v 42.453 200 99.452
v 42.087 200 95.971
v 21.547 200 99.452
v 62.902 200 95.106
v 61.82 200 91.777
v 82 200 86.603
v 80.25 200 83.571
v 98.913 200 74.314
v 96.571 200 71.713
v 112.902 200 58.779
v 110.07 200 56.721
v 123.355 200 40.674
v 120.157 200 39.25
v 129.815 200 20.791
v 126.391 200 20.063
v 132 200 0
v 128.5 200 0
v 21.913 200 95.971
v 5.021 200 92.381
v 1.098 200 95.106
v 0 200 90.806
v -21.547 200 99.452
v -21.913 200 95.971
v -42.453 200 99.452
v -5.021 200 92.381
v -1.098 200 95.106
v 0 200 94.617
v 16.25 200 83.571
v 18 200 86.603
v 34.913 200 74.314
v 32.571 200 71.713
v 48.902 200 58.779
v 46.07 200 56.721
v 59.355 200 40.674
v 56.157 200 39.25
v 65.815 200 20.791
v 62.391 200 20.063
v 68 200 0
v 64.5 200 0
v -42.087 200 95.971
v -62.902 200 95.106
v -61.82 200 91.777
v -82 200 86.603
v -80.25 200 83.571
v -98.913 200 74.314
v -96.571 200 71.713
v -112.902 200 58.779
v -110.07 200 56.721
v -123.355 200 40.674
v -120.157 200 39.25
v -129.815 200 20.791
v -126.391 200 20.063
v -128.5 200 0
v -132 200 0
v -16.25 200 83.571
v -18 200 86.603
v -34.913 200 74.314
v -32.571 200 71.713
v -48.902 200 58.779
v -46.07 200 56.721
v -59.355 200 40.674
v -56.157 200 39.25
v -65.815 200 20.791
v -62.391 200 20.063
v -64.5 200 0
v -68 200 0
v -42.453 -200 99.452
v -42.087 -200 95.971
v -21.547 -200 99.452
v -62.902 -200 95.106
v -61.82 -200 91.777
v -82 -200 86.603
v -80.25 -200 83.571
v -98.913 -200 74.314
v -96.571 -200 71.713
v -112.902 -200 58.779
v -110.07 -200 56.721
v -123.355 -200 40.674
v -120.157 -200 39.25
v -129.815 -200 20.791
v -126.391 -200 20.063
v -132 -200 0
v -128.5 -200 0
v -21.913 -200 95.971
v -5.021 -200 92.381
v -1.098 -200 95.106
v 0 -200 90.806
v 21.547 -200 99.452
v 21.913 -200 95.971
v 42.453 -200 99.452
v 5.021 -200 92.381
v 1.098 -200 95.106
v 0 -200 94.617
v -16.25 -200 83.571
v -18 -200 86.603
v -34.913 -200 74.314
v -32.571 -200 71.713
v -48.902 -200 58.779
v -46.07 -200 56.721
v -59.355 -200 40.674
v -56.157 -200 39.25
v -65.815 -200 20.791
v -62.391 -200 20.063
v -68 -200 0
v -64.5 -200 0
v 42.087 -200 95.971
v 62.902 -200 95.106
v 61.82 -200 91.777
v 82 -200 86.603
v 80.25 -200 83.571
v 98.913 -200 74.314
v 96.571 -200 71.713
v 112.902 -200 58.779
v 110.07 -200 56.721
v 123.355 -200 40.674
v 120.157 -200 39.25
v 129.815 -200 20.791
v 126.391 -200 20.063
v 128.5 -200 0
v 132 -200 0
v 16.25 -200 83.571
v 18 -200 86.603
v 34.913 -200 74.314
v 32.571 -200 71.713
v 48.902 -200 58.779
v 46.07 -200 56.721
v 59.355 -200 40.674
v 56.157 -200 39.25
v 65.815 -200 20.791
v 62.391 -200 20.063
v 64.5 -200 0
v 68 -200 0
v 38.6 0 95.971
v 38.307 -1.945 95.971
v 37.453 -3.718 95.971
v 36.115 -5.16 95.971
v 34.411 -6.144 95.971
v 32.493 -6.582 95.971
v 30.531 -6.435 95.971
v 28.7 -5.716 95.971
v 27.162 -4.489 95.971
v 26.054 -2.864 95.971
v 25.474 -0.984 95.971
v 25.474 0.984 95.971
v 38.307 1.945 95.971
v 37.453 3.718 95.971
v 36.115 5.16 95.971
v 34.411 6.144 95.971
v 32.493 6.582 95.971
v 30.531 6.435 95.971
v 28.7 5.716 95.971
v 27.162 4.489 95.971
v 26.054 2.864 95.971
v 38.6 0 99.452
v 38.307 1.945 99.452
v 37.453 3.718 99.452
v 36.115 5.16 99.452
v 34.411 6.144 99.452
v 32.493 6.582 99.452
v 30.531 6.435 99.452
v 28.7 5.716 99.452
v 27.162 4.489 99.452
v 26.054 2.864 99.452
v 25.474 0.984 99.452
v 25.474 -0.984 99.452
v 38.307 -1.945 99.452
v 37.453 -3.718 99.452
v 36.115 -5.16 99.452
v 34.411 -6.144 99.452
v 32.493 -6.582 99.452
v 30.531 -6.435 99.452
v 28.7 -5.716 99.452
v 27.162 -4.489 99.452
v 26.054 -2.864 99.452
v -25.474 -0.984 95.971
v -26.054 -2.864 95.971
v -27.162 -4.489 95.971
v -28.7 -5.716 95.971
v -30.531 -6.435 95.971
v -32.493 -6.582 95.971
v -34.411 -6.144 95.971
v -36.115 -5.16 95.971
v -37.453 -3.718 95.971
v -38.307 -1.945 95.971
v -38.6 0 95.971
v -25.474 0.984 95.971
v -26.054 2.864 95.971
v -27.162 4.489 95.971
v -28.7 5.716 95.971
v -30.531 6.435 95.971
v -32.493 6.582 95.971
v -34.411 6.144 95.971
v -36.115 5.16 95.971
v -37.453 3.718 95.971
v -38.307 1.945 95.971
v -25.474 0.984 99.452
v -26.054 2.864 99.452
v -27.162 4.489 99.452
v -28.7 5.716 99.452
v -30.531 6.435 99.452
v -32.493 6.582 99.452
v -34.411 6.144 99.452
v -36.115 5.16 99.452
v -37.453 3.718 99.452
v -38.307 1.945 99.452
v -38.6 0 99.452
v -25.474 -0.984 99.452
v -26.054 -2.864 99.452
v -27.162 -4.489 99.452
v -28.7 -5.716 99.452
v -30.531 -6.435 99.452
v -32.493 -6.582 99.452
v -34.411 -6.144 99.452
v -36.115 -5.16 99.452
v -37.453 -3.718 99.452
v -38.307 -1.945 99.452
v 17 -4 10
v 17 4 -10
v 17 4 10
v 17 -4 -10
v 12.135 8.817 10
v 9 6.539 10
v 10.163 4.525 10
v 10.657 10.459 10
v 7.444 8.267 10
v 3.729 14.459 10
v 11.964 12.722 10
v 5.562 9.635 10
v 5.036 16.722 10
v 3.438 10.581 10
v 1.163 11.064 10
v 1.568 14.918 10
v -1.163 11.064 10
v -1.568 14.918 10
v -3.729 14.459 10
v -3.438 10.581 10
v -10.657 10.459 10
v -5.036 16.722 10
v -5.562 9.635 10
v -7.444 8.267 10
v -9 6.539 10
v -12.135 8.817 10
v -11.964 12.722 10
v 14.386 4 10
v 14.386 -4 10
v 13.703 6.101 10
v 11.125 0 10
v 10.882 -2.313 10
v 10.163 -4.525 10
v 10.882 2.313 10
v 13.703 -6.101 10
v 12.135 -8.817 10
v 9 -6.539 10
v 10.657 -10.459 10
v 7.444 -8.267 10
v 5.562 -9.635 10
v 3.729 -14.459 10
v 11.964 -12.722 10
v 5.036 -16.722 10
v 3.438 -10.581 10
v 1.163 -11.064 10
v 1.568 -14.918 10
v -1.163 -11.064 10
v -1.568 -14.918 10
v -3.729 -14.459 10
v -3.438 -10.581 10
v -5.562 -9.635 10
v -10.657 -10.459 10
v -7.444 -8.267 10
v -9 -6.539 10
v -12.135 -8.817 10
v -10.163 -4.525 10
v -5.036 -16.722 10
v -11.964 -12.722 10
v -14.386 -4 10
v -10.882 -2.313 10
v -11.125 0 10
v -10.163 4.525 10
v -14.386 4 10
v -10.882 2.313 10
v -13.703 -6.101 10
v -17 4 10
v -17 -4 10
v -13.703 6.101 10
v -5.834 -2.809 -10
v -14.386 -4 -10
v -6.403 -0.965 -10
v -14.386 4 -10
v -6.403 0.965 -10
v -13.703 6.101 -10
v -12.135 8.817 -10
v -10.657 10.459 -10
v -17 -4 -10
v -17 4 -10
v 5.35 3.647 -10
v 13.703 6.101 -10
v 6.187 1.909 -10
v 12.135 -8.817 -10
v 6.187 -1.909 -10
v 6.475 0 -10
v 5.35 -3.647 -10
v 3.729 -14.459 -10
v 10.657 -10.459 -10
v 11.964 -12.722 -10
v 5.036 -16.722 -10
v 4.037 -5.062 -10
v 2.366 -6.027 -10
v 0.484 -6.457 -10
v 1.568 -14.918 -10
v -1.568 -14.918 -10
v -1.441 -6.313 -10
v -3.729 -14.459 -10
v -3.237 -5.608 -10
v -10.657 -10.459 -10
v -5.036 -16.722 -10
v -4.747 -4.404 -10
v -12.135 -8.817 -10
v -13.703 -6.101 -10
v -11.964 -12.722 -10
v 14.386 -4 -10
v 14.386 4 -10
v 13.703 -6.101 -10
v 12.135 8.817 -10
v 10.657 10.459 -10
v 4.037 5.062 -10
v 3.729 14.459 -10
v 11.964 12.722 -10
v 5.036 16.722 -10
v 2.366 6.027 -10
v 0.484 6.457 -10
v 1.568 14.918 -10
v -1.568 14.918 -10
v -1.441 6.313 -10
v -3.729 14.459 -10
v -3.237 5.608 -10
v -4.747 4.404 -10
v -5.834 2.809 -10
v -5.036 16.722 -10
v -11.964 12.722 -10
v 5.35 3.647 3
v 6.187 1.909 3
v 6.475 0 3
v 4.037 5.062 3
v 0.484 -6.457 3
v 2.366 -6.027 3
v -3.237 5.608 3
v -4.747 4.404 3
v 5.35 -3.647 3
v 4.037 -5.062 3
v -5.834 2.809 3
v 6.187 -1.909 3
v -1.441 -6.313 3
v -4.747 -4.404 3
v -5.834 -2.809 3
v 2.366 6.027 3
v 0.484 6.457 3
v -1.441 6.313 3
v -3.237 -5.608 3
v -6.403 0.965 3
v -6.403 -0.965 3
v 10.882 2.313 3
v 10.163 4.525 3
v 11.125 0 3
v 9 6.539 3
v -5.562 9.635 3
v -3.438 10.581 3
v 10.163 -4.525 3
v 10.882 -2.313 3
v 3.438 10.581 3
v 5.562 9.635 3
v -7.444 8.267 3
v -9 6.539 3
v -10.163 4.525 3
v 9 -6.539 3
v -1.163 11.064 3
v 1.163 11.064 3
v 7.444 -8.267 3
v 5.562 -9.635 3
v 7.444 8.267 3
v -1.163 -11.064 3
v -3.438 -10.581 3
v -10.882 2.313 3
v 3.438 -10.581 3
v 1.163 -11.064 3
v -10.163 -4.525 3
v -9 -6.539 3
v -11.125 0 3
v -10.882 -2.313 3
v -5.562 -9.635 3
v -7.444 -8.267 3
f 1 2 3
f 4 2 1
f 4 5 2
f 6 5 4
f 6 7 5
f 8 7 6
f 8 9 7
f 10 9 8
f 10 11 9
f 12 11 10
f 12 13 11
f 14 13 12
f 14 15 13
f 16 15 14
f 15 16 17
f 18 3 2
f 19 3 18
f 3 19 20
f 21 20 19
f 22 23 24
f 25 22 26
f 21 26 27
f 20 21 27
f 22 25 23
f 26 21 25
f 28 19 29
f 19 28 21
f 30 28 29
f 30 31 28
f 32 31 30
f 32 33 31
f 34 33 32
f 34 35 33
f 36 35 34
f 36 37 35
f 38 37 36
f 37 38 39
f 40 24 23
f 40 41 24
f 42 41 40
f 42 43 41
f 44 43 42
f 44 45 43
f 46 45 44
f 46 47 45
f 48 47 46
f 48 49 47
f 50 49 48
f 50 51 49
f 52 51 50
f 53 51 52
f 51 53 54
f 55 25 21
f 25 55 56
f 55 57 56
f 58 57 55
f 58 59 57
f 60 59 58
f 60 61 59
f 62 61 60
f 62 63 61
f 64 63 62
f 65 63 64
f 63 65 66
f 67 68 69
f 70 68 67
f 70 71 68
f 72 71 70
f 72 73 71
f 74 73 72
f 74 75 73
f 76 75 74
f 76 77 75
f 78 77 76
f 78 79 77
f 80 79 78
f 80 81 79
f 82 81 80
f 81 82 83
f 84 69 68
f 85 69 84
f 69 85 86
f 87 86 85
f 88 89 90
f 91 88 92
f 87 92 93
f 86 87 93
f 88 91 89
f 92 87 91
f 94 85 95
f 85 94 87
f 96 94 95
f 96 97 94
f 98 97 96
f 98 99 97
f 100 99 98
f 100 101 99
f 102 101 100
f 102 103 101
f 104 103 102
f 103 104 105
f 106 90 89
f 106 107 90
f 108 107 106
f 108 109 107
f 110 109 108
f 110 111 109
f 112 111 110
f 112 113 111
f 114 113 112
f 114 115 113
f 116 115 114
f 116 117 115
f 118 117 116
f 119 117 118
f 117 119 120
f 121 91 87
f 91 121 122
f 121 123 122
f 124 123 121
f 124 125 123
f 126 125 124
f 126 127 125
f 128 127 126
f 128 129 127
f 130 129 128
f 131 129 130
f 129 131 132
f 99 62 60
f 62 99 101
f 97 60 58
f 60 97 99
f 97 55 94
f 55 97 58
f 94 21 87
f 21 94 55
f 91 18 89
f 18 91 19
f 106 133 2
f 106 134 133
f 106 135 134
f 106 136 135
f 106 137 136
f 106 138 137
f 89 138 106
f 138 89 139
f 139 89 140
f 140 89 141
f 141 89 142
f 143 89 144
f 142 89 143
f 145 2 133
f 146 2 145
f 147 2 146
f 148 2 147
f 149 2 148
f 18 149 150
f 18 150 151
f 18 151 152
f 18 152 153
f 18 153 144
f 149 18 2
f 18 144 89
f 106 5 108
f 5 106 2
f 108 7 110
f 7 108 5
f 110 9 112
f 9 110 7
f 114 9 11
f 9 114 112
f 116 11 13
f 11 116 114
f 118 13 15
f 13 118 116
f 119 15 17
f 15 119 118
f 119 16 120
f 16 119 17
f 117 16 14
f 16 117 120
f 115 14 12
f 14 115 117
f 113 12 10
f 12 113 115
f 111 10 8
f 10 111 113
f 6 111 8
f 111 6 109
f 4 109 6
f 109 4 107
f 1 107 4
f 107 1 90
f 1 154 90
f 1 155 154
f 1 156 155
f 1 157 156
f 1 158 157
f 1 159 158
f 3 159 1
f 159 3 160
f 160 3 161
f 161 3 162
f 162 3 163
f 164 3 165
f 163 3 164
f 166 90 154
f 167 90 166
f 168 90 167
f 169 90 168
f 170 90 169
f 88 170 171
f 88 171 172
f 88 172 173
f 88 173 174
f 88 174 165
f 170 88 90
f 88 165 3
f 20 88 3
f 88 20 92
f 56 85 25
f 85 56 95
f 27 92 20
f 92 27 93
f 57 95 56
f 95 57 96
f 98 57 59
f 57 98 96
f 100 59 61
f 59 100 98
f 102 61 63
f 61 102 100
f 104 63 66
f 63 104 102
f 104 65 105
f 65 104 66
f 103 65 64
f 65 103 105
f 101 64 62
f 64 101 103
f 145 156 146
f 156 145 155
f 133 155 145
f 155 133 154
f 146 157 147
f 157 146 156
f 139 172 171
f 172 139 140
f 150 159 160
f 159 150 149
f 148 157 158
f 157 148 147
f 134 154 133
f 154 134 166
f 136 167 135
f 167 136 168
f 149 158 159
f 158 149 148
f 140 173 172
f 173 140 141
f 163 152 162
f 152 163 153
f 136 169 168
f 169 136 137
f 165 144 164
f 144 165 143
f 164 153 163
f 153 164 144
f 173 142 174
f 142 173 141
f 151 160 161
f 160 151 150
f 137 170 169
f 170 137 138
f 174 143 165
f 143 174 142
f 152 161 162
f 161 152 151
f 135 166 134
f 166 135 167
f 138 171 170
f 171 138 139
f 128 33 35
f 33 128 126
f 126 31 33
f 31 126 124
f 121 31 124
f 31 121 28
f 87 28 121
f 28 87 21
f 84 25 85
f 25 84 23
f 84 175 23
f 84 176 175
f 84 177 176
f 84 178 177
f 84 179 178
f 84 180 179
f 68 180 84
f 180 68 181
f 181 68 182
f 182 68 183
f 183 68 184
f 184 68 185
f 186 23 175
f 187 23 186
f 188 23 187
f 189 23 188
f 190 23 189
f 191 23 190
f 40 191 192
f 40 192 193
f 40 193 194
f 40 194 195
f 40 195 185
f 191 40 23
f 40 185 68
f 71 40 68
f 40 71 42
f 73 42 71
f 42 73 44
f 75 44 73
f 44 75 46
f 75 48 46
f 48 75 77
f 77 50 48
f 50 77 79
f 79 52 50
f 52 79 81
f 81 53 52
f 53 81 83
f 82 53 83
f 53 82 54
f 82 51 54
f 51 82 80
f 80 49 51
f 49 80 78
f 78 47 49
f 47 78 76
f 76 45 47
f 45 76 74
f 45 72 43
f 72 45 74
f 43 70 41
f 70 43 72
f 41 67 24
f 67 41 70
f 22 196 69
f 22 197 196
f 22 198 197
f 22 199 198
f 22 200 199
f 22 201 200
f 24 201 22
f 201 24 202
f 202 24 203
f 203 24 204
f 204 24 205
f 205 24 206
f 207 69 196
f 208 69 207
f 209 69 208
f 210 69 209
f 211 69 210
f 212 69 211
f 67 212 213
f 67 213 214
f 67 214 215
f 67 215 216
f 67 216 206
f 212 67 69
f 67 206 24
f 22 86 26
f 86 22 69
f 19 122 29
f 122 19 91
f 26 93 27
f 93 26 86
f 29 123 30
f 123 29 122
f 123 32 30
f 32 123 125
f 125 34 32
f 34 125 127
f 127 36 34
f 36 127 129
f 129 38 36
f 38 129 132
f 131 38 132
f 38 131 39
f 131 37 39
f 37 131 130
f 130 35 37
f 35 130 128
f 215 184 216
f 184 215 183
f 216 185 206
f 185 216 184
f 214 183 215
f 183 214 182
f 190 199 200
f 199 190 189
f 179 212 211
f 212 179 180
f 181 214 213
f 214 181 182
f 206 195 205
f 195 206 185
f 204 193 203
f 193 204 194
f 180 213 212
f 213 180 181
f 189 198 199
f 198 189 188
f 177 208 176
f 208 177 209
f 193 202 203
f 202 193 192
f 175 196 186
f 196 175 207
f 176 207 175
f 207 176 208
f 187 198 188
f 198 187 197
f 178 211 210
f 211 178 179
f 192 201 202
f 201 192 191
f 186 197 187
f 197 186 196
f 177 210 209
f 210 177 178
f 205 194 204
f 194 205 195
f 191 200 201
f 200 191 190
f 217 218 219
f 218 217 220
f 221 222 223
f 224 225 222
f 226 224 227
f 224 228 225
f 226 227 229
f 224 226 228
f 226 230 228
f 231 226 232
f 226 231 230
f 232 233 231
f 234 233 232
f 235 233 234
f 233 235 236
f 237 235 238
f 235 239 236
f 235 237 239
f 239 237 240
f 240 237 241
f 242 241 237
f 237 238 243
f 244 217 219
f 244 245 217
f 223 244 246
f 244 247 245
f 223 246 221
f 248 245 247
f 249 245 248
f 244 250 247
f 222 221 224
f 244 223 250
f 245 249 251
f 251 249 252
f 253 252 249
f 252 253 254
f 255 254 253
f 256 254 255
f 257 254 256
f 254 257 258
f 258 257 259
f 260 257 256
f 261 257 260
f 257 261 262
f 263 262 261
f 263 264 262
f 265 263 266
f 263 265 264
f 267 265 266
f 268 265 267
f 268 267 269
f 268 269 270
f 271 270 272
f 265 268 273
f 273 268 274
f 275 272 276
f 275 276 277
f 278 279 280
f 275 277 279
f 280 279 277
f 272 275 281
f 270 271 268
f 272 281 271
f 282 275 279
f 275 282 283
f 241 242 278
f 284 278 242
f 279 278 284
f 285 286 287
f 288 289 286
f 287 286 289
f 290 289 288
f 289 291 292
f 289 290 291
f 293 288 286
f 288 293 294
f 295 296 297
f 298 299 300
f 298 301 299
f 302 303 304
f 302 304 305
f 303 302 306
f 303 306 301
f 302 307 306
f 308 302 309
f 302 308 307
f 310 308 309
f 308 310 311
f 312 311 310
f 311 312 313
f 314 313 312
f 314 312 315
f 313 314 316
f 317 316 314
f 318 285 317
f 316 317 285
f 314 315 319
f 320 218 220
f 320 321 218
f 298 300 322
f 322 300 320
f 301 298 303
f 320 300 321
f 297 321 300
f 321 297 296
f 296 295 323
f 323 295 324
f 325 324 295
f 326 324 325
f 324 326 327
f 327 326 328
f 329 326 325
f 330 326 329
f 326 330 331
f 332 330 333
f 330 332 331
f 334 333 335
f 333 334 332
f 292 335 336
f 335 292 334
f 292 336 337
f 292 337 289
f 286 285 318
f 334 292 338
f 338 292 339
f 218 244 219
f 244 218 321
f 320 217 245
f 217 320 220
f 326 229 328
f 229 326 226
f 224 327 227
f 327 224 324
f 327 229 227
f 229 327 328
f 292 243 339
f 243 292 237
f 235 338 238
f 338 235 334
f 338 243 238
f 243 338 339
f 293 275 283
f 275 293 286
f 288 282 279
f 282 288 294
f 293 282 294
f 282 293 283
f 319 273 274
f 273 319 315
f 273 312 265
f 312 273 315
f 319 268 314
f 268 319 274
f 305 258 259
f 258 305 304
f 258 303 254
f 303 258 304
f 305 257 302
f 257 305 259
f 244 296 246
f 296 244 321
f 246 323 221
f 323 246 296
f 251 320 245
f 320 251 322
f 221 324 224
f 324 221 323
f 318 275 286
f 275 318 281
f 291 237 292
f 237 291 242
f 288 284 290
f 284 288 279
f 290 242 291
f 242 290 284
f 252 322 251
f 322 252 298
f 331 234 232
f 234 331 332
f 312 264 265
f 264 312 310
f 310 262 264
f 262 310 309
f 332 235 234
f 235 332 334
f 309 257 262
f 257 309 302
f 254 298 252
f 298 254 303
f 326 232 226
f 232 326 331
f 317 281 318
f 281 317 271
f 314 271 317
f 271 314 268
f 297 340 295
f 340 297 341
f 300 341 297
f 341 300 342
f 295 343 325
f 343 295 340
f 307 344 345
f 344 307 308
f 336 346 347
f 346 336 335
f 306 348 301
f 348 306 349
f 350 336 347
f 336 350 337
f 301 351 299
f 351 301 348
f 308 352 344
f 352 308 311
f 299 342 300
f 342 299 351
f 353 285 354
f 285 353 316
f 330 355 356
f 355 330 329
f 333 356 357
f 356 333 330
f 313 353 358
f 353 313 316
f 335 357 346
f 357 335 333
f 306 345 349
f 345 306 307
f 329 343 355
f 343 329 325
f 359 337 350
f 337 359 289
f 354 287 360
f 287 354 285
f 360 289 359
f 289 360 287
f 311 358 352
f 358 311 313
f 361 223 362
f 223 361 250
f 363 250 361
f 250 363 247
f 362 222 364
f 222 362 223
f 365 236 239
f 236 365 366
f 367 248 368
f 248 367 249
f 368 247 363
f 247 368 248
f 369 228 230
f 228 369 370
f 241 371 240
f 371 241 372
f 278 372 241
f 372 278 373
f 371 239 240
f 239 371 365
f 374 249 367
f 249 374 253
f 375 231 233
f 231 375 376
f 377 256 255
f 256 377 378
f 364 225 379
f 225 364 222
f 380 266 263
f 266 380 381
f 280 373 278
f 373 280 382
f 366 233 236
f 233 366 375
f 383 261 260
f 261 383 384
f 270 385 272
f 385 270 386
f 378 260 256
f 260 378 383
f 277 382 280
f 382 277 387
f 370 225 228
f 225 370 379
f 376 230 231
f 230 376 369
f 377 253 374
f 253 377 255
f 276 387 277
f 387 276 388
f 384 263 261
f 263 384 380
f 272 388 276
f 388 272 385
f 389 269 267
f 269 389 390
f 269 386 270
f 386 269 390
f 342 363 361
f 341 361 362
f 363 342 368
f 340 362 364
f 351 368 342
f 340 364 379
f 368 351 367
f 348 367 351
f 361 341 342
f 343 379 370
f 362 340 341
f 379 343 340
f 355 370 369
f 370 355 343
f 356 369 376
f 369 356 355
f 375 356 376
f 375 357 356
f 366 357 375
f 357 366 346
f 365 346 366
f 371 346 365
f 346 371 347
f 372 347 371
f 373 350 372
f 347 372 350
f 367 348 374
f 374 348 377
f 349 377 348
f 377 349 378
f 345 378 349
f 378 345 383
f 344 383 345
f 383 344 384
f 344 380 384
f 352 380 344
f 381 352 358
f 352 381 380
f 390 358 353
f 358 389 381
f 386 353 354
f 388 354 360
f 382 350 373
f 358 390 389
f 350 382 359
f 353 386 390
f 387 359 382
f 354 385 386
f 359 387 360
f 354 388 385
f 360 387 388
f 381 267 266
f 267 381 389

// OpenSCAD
// ============================================================
// REVOLT — Remote Energy Via Optimized Load Turbine
// V1.0 Savonius Scoop — OpenSCAD Source
// License: CC0 / Public Domain — Build it free, forever.
// ============================================================
// PARAMETERS — edit these to scale your build
// ============================================================

rotor_diameter   = 200;   // mm — total rotor diameter
overlap_ratio    = 0.18;  // 18% center overlap (venting gap)
aspect_ratio     = 2.0;   // height:diameter per segment
wall_thickness   = 3.5;   // mm — scoop shell thickness
shaft_diameter   = 12.7;  // mm — 1/2" stainless rod
hub_od           = 30;    // mm — hub outer diameter
hub_height       = 20;    // mm — hub collar height
snap_tab_width   = 8;     // mm — snap fit tab width
snap_tab_depth   = 2;     // mm — snap fit engagement depth
bearing_od       = 22;    // mm — 608 bearing OD
bearing_id       = 8;     // mm — 608 bearing ID (use shaft_diameter for fit)
bearing_height   = 7;     // mm — 608 bearing height
print_tolerance  = 0.25;  // mm — FDM fit tolerance

// ============================================================
// DERIVED VALUES
// ============================================================

scoop_radius     = rotor_diameter / 2;
scoop_height     = rotor_diameter * aspect_ratio;
overlap_offset   = rotor_diameter * overlap_ratio;
scoop_center_x   = (scoop_radius / 2) - (overlap_offset / 2);

// ============================================================
// MODULES
// ============================================================

// Single Savonius scoop — semi-circular drag surface
module savonius_scoop() {
    difference() {
        // Outer shell — full semi-cylinder
        rotate([90, 0, 0])
        linear_extrude(height = scoop_height, center = true)
        difference() {
            circle(r = scoop_radius);
            circle(r = scoop_radius - wall_thickness);
            // Clip to 180 degrees (semi-circle only)
            translate([-scoop_radius - 1, -scoop_radius - 1])
                square([scoop_radius * 2 + 2, scoop_radius + 1]);
        }
        // Shaft clearance hole through hub zone
        cylinder(h = scoop_height + 2, d = shaft_diameter + print_tolerance * 2, center = true);
    }
}

// Hub collar with keyed slot for stacking
module hub_collar(key_slots = 6) {
    difference() {
        union() {
            // Main collar body
            cylinder(h = hub_height, d = hub_od, center = true);
            // Snap fit tabs — allows CW/CCW flip on Z axis
            for (i = [0 : key_slots - 1]) {
                rotate([0, 0, i * (360 / key_slots)])
                translate([hub_od / 2, 0, 0])
                cube([snap_tab_depth * 2, snap_tab_width, hub_height], center = true);
            }
        }
        // Shaft bore
        cylinder(h = hub_height + 1, d = shaft_diameter + print_tolerance, center = true);
        // Bearing seat — top
        translate([0, 0, hub_height / 2 - bearing_height])
            cylinder(h = bearing_height + 1, d = bearing_od + print_tolerance, center = false);
    }
}

// Full rotor assembly — two scoops + hub, offset by overlap ratio
module rotor_assembly() {
    // Scoop A — primary power stroke side
    translate([scoop_center_x, 0, 0])
        savonius_scoop();

    // Scoop B — returning side, rotated 180 degrees
    // Flip 180° on Z to reverse rotation direction if needed
    rotate([0, 0, 180])
    translate([scoop_center_x, 0, 0])
        savonius_scoop();

    // Central hub
    hub_collar();
}

// Base mount — universal 1" PVC / T-post / roof rack interface
module base_mount() {
    pvc_od = 33.4; // 1" nominal PVC outer diameter mm
    mount_height = 40;
    mount_od = 60;

    difference() {
        union() {
            cylinder(h = mount_height, d = mount_od, center = false);
            // Four bolt flanges at 90 degrees
            for (i = [0:3]) {
                rotate([0, 0, i * 90])
                translate([mount_od / 2, 0, mount_height / 2])
                cube([20, 12, mount_height], center = true);
            }
        }
        // PVC pipe socket
        cylinder(h = mount_height + 1, d = pvc_od + print_tolerance, center = false);
        // Shaft through-hole
        cylinder(h = mount_height + 1, d = shaft_diameter + print_tolerance * 2, center = false);
        // Bolt holes in flanges — M5
        for (i = [0:3]) {
            rotate([0, 0, i * 90])
            translate([mount_od / 2 + 8, 0, mount_height / 2])
            cylinder(h = mount_height + 1, d = 5.5, center = true);
        }
    }
}

// Manual overdrive hand crank attachment
module hand_crank() {
    crank_length = 120;
    crank_grip_d = 25;
    crank_arm_w  = 15;
    crank_arm_h  = 10;

    union() {
        // Crank arm
        cube([crank_length, crank_arm_w, crank_arm_h], center = false);
        // Grip ball
        translate([crank_length, crank_arm_w / 2, crank_arm_h / 2])
            sphere(d = crank_grip_d);
        // Shaft collar
        difference() {
            cylinder(h = crank_arm_h * 2, d = hub_od, center = true);
            cylinder(h = crank_arm_h * 2 + 1, d = shaft_diameter + print_tolerance, center = true);
        }
    }
}

// ============================================================
// RENDER — comment/uncomment to export each part separately
// ============================================================

rotor_assembly();
// translate([0, 0, -60]) base_mount();
// translate([120, 0, 0]) hand_crank();
// translate([0, 80, 0]) hub_collar();

// ============================================================
// PRINT NOTES:
// - Material: PETG or ASA preferred. PLA+ for prototyping only.
// - Layer height: 0.28mm
// - Walls: 4-6 perimeters
// - Infill: 15-20% Gyroid
// - Supports: None required for scoop if printed vertically
// - Flip scoop 180 degrees on Z to reverse rotation direction
// ============================================================
